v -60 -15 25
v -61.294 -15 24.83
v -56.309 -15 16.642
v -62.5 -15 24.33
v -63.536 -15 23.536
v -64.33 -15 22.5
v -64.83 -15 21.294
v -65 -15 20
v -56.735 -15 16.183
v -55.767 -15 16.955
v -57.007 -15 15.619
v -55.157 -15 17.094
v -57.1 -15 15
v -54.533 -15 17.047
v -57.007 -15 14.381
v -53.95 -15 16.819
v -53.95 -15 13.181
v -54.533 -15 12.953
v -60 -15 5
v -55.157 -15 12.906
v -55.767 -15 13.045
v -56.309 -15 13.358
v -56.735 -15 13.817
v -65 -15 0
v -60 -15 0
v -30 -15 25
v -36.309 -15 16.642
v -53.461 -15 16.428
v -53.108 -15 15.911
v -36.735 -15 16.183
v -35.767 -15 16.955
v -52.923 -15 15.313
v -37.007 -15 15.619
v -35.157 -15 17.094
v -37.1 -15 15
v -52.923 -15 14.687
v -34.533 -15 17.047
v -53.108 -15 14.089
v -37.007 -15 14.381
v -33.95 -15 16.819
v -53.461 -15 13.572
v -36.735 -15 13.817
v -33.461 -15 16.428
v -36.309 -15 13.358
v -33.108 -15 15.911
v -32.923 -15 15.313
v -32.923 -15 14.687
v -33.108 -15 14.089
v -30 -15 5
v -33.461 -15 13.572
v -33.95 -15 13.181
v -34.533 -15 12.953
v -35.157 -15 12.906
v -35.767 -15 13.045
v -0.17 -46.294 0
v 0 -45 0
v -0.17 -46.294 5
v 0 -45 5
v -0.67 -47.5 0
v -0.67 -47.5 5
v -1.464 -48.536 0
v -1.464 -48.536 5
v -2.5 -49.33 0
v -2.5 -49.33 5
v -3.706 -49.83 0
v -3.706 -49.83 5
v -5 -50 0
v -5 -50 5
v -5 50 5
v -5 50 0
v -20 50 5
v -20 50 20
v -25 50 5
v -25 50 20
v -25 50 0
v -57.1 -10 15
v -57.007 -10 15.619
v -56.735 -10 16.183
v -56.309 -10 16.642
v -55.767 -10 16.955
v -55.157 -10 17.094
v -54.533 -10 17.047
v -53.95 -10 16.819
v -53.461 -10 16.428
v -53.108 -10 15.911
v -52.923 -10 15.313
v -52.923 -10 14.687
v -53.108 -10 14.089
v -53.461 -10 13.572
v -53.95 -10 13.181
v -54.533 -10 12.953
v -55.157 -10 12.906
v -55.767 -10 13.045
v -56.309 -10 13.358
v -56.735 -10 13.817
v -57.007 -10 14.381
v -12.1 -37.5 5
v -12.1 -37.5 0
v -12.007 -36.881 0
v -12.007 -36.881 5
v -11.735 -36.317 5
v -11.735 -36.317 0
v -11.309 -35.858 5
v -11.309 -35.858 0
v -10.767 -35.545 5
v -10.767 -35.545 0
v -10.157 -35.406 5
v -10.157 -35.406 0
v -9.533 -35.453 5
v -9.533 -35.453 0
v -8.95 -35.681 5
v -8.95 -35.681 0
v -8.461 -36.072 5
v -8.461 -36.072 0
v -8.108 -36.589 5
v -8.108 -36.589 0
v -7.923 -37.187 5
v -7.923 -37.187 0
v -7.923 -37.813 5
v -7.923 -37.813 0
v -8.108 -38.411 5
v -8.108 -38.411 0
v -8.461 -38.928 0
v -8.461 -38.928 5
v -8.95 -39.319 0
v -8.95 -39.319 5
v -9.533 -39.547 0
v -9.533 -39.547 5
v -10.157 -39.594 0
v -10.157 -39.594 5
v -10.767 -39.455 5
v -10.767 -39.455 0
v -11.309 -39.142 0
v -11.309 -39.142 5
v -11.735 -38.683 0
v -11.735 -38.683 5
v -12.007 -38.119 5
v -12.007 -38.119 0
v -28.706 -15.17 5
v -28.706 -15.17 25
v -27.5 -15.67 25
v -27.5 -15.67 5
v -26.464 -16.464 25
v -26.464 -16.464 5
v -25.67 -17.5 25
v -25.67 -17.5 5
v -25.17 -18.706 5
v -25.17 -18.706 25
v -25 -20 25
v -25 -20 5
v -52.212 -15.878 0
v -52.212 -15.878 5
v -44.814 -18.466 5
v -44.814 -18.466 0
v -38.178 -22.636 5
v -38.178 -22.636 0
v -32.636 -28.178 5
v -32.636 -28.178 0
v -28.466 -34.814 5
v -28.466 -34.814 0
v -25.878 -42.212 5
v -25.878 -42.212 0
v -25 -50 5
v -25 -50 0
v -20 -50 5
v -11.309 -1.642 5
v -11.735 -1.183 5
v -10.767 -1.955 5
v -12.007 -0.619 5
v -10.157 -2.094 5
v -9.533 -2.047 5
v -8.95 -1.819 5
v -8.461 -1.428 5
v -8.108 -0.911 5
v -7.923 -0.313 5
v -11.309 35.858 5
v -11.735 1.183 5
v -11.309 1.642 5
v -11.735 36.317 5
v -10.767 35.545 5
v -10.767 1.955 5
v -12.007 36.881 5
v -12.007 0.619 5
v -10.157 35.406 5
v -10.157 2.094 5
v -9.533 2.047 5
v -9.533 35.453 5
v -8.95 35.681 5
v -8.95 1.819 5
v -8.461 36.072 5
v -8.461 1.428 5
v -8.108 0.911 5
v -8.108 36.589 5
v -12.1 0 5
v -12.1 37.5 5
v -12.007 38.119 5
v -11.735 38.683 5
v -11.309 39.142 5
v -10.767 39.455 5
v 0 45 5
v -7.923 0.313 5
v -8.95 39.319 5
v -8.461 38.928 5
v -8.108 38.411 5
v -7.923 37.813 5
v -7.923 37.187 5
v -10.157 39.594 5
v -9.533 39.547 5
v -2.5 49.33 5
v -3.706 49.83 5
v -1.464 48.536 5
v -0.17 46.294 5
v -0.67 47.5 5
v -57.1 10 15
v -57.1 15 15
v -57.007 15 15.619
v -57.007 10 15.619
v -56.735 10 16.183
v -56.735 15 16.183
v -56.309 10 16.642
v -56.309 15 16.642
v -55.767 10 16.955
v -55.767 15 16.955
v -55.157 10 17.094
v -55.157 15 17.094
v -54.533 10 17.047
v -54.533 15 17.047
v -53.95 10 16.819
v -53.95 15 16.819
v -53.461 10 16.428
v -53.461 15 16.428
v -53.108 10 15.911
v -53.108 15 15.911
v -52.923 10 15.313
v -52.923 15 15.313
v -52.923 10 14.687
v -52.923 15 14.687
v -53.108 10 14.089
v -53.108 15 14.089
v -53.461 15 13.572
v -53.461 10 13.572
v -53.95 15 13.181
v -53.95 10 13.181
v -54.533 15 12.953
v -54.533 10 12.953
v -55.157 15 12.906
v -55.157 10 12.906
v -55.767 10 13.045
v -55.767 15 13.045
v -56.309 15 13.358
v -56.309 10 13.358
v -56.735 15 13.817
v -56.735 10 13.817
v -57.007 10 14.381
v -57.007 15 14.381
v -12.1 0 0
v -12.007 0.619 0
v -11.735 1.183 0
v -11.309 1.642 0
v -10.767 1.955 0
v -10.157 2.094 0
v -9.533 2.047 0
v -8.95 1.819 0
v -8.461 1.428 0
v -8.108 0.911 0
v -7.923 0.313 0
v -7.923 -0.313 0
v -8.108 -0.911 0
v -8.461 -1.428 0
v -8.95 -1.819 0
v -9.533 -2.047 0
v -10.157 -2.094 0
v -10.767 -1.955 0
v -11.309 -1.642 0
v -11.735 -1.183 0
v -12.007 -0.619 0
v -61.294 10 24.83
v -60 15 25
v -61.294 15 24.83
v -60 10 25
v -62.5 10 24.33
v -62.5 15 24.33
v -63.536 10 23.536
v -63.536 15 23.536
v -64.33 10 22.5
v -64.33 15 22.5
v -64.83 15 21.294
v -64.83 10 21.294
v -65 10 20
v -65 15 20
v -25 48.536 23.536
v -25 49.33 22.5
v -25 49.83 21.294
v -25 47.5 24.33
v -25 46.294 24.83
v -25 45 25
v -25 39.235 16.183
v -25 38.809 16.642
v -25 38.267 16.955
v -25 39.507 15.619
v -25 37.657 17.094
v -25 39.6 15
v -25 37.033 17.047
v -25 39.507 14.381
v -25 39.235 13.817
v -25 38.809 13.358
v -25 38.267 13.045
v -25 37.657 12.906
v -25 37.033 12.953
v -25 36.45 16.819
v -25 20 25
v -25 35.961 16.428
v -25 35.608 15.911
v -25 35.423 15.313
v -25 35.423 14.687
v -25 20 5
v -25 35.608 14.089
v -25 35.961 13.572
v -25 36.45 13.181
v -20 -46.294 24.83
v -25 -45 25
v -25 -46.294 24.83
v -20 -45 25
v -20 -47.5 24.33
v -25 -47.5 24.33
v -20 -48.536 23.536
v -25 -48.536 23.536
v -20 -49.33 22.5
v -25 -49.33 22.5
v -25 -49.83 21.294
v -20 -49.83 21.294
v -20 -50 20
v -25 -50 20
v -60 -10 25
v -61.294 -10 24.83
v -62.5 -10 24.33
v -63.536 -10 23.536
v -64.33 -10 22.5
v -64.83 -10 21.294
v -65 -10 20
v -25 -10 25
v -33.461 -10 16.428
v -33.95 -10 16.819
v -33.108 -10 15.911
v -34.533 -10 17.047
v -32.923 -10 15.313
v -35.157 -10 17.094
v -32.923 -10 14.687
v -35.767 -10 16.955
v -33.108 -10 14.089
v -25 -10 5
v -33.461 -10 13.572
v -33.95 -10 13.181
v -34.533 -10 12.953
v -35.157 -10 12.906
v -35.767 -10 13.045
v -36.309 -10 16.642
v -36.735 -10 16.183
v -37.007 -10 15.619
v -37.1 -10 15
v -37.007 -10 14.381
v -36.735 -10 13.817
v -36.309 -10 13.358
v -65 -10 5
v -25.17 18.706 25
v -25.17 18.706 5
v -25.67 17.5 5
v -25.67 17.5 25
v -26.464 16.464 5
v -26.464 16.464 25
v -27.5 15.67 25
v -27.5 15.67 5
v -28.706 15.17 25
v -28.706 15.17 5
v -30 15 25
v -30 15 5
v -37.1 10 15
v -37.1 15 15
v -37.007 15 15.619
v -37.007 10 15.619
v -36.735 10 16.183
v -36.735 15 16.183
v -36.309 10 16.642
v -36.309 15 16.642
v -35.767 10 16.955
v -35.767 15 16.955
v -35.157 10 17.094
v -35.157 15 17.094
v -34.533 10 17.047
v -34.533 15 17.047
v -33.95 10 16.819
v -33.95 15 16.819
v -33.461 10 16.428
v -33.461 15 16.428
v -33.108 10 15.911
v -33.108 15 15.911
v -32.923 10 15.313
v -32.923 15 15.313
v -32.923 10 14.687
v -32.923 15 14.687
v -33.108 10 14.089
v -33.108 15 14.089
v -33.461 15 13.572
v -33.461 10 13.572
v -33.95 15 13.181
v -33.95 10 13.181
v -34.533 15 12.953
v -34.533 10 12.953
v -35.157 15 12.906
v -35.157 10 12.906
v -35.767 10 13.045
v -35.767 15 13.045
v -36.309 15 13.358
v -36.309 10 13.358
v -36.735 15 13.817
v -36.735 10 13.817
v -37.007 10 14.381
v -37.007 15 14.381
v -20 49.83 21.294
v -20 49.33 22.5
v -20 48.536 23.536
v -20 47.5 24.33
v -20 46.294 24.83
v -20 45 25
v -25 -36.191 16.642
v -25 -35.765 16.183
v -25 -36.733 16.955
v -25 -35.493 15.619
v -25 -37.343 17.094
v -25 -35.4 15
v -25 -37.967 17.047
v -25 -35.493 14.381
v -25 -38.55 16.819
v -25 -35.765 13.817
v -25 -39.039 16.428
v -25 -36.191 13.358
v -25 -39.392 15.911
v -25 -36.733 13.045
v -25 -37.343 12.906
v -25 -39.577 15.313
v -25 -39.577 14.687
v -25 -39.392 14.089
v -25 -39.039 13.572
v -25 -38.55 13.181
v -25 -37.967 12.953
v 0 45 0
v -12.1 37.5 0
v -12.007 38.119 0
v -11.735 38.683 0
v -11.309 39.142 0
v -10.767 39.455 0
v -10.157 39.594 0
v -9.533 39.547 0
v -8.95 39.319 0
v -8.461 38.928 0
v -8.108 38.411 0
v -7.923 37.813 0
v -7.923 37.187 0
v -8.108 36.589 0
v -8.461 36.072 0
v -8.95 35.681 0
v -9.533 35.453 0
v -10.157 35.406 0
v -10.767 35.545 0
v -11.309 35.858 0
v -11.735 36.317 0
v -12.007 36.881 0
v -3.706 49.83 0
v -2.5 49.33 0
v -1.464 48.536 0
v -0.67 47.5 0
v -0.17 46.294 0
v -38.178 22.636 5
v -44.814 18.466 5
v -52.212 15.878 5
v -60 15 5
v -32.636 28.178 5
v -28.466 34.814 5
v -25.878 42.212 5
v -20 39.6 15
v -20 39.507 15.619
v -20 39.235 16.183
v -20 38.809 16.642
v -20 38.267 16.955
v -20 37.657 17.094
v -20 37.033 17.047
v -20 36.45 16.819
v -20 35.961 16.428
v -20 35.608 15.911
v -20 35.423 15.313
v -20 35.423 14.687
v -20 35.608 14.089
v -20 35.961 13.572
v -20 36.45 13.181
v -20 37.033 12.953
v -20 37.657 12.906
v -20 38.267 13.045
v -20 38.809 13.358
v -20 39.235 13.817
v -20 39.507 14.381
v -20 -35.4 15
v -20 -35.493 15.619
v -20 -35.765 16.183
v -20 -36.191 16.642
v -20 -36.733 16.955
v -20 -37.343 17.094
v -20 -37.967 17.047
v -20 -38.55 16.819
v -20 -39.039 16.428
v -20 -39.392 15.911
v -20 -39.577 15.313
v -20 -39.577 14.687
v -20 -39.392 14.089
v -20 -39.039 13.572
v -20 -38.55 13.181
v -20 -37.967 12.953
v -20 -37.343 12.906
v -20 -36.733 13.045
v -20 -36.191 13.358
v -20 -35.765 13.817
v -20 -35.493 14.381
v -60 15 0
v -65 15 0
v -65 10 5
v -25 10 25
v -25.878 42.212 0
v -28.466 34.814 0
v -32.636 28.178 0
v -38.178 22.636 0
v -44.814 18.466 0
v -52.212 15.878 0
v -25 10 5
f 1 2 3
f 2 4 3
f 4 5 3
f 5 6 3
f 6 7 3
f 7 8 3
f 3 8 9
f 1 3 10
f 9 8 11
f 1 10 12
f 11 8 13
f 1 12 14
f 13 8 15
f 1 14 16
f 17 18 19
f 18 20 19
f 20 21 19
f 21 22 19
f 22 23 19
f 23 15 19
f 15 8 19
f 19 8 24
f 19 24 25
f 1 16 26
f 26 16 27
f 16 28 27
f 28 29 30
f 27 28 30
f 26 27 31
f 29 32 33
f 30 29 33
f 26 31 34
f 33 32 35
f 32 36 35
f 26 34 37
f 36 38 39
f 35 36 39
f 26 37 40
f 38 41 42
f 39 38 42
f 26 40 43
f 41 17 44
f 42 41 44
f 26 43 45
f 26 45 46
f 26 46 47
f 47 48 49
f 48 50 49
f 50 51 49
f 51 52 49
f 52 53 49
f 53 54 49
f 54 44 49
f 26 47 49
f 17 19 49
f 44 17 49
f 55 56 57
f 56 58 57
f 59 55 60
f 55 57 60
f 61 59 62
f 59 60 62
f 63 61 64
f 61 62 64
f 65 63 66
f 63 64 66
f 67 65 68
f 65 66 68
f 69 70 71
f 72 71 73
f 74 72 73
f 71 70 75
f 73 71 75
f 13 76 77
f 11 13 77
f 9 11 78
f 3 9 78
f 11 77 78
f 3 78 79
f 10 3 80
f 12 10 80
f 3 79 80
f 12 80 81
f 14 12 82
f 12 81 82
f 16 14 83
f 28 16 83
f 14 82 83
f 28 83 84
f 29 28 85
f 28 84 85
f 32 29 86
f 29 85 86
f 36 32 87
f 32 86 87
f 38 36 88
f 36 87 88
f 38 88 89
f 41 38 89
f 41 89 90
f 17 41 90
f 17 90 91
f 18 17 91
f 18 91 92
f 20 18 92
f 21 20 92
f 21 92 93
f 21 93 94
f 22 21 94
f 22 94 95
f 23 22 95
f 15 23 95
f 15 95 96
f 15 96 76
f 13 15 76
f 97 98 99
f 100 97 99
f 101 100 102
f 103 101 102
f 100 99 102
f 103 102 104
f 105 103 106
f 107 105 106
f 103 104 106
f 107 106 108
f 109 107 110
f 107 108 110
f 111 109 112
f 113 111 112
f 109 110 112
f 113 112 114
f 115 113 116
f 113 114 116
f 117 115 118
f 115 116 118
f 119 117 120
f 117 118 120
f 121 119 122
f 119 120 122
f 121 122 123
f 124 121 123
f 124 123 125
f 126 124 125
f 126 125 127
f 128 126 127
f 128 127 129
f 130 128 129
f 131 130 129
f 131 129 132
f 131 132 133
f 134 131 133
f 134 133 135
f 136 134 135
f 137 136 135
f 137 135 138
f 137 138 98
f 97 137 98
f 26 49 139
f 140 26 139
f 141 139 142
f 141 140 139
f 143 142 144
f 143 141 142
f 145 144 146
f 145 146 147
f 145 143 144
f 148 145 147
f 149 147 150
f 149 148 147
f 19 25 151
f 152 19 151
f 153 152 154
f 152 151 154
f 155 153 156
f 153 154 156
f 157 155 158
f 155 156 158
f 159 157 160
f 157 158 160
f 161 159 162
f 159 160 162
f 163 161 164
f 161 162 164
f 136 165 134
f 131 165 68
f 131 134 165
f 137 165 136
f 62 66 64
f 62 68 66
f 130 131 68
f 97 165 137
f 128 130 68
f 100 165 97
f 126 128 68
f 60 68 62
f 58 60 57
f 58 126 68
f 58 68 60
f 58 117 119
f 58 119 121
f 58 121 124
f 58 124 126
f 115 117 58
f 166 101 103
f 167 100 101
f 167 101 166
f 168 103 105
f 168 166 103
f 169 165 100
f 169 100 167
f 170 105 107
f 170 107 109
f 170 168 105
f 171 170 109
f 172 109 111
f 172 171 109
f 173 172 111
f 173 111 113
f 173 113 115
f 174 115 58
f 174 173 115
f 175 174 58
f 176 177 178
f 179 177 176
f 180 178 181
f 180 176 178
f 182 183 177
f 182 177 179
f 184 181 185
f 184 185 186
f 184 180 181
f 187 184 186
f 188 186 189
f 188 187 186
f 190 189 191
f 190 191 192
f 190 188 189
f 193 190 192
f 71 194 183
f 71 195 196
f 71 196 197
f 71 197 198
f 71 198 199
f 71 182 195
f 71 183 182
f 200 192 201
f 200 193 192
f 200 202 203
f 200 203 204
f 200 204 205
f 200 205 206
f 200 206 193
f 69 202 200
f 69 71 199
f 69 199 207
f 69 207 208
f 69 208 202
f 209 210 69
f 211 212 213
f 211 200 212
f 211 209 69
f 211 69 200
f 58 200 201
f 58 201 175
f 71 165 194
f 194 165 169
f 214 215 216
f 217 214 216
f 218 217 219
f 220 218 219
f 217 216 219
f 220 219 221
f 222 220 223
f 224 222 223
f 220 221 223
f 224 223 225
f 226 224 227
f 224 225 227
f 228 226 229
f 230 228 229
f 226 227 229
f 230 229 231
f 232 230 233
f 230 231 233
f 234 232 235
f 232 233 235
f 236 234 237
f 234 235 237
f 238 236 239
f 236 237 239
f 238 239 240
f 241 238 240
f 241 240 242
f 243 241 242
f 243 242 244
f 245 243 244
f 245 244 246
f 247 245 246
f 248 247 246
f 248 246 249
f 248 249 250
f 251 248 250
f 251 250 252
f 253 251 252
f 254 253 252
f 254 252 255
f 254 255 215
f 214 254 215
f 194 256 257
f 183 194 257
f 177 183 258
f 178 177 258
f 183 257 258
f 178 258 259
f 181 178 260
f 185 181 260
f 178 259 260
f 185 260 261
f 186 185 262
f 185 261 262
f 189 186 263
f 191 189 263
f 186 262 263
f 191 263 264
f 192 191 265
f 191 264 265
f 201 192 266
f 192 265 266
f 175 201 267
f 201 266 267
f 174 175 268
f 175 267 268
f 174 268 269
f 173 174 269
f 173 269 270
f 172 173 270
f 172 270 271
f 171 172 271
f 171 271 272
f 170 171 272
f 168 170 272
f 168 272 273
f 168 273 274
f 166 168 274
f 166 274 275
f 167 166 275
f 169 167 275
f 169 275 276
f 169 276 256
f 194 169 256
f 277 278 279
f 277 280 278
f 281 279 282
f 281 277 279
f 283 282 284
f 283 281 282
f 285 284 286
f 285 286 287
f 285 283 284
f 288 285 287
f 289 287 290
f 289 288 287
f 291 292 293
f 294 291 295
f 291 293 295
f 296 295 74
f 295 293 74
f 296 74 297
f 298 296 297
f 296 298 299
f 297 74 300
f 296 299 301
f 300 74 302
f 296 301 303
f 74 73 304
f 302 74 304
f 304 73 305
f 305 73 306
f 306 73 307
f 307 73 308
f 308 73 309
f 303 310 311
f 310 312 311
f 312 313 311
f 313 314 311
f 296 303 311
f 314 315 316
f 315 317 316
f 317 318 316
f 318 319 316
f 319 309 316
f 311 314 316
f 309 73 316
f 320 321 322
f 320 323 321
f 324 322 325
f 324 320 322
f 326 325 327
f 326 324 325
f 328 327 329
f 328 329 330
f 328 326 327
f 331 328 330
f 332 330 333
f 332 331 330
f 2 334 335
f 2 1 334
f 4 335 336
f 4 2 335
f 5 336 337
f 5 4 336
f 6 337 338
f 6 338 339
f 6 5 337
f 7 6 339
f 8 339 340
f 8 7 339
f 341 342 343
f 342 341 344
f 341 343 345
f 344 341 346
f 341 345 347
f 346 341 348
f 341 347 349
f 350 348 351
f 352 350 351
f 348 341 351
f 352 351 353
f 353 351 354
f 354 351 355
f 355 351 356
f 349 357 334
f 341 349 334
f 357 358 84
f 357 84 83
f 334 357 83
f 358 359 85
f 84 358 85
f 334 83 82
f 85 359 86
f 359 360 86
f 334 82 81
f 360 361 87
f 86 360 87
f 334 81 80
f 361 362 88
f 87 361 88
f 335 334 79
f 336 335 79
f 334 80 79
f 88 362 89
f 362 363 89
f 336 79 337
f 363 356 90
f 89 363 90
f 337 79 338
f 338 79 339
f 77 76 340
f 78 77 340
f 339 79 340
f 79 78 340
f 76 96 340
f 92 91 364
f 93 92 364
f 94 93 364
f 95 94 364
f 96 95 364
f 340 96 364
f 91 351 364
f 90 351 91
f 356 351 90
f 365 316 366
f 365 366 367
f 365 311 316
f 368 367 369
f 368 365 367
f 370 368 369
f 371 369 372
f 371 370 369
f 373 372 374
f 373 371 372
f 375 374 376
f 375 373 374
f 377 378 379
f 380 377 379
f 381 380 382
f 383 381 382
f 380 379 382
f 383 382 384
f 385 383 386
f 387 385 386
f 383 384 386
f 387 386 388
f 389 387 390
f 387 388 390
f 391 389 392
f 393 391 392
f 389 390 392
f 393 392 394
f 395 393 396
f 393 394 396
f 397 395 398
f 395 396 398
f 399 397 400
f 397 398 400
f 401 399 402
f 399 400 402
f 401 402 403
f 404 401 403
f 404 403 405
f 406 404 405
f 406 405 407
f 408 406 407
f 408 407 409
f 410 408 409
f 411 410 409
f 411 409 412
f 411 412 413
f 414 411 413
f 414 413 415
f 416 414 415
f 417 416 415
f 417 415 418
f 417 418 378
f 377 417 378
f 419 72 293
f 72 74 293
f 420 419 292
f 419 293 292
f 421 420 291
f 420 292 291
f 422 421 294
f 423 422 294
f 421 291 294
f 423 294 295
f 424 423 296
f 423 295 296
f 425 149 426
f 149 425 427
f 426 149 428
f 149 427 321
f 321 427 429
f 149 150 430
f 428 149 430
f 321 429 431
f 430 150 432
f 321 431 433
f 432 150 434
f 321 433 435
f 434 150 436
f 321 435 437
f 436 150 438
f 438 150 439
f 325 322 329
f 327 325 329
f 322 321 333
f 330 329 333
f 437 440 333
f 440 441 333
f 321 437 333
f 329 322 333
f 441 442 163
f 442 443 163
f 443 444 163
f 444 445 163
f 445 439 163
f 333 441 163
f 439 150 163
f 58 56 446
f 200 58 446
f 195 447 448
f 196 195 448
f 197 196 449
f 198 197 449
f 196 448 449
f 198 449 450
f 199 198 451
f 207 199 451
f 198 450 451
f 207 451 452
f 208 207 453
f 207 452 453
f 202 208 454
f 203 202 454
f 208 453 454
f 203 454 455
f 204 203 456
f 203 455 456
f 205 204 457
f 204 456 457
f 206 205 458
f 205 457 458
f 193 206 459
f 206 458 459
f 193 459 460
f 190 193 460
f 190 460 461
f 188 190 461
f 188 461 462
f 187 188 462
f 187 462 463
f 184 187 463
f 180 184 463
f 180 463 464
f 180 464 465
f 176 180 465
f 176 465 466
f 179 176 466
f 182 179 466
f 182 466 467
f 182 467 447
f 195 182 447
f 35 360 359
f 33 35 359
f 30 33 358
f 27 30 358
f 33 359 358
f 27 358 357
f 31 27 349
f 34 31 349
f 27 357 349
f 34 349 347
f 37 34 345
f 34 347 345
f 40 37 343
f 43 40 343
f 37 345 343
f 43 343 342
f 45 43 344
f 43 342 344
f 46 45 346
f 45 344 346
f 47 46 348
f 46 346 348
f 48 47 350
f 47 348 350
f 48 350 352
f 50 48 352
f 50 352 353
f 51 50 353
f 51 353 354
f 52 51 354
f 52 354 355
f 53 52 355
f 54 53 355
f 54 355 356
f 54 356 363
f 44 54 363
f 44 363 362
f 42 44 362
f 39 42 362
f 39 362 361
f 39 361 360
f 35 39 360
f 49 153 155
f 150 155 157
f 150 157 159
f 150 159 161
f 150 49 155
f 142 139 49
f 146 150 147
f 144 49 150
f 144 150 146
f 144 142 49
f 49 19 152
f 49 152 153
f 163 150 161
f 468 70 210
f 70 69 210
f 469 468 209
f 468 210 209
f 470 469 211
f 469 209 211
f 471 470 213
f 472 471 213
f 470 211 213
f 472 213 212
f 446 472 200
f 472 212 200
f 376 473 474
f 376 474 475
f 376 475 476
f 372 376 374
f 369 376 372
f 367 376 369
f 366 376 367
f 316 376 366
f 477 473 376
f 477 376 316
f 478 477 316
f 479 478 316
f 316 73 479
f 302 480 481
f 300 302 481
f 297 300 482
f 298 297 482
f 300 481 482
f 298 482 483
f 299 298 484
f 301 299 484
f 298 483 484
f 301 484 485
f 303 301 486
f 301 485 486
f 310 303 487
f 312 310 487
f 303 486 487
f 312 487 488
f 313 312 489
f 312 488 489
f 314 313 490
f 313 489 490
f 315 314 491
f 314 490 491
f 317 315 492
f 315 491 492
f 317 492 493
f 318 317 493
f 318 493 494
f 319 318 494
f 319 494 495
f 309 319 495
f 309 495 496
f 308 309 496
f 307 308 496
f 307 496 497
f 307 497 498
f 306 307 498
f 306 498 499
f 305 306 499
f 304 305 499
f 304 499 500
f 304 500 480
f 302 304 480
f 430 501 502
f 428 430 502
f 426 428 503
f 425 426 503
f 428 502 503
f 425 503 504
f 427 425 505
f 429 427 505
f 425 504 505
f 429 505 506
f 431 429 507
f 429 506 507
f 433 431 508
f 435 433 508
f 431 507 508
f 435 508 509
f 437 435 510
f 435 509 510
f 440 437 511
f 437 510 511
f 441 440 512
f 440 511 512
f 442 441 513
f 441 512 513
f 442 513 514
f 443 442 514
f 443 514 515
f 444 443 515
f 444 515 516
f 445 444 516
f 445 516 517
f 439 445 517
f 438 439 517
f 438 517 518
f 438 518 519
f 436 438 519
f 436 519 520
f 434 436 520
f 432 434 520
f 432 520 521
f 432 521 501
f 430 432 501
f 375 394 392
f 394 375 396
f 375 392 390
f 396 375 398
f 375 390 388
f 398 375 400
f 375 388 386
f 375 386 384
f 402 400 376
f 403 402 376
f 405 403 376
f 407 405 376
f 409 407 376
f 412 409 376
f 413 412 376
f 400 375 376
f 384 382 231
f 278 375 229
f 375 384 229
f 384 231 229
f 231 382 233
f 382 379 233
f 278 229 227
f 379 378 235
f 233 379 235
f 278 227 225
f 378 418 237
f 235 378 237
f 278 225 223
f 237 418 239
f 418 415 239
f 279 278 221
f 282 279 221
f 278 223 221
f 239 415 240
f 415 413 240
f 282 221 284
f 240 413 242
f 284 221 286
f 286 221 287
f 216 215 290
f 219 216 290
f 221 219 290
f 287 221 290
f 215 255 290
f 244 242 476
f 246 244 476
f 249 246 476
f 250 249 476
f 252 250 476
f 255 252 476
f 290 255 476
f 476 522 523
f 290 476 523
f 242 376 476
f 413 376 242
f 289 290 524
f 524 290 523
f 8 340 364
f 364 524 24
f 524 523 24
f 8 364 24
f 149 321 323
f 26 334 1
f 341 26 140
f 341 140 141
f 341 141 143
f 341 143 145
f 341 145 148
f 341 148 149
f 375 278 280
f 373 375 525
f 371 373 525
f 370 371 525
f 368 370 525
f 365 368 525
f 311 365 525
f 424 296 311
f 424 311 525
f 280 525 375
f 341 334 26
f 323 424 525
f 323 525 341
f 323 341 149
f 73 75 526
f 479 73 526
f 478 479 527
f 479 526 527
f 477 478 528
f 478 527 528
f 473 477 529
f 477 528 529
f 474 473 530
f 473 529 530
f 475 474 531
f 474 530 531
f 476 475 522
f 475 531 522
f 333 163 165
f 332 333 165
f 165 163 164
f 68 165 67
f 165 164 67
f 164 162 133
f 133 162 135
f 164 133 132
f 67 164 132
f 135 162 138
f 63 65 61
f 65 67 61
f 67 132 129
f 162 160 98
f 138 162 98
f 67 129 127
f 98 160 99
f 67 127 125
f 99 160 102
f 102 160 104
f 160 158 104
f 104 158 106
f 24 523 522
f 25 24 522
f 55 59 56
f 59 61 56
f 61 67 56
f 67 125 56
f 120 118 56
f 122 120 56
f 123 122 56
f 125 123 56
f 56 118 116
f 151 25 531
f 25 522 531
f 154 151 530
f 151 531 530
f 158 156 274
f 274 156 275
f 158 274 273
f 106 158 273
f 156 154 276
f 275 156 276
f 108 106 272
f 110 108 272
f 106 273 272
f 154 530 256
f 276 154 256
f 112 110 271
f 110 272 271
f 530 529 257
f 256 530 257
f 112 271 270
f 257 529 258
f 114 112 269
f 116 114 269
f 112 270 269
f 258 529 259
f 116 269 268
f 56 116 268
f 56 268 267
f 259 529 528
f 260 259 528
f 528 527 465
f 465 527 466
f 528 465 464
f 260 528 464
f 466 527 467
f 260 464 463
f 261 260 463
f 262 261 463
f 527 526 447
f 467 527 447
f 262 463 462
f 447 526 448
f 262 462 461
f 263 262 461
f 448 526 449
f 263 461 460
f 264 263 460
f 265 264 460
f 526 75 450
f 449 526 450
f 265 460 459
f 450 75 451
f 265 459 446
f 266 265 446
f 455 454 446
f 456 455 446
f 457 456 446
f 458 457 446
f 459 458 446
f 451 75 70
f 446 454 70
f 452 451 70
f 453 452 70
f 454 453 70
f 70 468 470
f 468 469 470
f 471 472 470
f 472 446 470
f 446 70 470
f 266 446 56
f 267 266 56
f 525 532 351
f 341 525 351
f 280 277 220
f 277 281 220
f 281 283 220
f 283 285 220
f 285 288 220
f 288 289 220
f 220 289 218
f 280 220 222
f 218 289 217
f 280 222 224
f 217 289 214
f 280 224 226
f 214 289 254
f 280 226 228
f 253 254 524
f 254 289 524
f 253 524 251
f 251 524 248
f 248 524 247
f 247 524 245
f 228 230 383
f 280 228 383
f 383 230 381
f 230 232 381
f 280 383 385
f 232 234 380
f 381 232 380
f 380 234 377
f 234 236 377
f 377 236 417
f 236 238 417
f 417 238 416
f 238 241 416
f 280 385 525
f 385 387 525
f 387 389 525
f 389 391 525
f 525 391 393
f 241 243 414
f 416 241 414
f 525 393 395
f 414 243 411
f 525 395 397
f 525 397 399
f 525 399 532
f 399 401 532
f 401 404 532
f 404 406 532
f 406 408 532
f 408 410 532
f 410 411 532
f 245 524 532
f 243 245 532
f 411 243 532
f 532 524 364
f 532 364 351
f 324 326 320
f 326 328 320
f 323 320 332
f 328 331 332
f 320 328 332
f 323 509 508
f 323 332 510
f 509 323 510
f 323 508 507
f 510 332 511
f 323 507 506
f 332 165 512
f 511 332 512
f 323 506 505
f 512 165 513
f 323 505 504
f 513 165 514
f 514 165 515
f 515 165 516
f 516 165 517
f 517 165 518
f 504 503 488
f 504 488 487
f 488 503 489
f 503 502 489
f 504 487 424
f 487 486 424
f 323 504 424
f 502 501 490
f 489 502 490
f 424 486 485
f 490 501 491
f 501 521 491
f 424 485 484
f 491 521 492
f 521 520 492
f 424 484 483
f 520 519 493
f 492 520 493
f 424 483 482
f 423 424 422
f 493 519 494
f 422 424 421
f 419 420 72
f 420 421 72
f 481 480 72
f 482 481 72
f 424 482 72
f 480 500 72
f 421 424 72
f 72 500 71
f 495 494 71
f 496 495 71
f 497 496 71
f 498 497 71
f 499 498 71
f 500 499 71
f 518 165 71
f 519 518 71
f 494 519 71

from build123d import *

# Parameters (mm, degrees)
F1_DEPTH   = 5
F3_DEPTH   = 20
F7_D       = 4.2
F7_ON_F5_D = 4.2
F7_ON_F4_D = 4.2
F8_R       = 5


with BuildPart() as f1:
    # F0 (on Top) → F1 (new body)
    with BuildSketch(Plane.XY):
        with BuildLine():
            Line((0, -50), (0, 0))
            Line((0, 0), (0, 50))
            Line((0, 50), (-25, 50))
            ThreePointArc((-25, 50), (-35.2512626585, 25.2512626585), (-60, 15))
            Line((-60, 15), (-65, 15))
            Line((-65, 15), (-65, 0))
            Line((-65, 0), (-65, -15))
            Line((-65, -15), (-60, -15))
            ThreePointArc((-60, -15), (-35.2512626585, -25.2512626585), (-25, -50))
            Line((-25, -50), (0, -50))
        make_face()
    extrude(amount=F1_DEPTH)

    # F2 (on face) → F3 (join)
    with BuildSketch(Plane.XY.offset(5)):
        Polygon((-20, 50), (-25, 50), (-25, 15), (-65, 15), (-65, 10), (-25, 10), (-25, -10), (-65, -10), (-65, -15), (-25, -15), (-25, -50), (-20, -50), align=None)
    extrude(amount=F3_DEPTH)

    # F7 (through all)
    with Locations(Plane.XY.offset(5)):
        with Locations((-10, -37.5), (-10, 0), (-10, 37.5)):
            Hole(F7_D / 2)

    # F7 on F5 (through all)
    with Locations(Plane(origin=(-25, 0, 0), x_dir=(0, -1, 0), z_dir=(-1, 0, 0))):
        with Locations((37.5, 15), (-37.5, 15)):
            Hole(F7_ON_F5_D / 2)

    # F7 on F4 (through all)
    with Locations(Plane.XZ.offset(15)):
        with Locations((-55, 15), (-35, 15)):
            Hole(F7_ON_F4_D / 2)

    # F8
    f8_edges = [f1.edges().sort_by_distance(p)[0] for p in [
        (-65, -12.5, 25),
        (-65, 12.5, 25),
        (-22.5, 50, 25),
        (-22.5, -50, 25),
        (0, -50, 2.5),
        (0, 50, 2.5),
        (-25, -15, 15),
        (-25, 15, 15),
    ]]
    fillet(f8_edges, radius=F8_R)


solid = f1.part
